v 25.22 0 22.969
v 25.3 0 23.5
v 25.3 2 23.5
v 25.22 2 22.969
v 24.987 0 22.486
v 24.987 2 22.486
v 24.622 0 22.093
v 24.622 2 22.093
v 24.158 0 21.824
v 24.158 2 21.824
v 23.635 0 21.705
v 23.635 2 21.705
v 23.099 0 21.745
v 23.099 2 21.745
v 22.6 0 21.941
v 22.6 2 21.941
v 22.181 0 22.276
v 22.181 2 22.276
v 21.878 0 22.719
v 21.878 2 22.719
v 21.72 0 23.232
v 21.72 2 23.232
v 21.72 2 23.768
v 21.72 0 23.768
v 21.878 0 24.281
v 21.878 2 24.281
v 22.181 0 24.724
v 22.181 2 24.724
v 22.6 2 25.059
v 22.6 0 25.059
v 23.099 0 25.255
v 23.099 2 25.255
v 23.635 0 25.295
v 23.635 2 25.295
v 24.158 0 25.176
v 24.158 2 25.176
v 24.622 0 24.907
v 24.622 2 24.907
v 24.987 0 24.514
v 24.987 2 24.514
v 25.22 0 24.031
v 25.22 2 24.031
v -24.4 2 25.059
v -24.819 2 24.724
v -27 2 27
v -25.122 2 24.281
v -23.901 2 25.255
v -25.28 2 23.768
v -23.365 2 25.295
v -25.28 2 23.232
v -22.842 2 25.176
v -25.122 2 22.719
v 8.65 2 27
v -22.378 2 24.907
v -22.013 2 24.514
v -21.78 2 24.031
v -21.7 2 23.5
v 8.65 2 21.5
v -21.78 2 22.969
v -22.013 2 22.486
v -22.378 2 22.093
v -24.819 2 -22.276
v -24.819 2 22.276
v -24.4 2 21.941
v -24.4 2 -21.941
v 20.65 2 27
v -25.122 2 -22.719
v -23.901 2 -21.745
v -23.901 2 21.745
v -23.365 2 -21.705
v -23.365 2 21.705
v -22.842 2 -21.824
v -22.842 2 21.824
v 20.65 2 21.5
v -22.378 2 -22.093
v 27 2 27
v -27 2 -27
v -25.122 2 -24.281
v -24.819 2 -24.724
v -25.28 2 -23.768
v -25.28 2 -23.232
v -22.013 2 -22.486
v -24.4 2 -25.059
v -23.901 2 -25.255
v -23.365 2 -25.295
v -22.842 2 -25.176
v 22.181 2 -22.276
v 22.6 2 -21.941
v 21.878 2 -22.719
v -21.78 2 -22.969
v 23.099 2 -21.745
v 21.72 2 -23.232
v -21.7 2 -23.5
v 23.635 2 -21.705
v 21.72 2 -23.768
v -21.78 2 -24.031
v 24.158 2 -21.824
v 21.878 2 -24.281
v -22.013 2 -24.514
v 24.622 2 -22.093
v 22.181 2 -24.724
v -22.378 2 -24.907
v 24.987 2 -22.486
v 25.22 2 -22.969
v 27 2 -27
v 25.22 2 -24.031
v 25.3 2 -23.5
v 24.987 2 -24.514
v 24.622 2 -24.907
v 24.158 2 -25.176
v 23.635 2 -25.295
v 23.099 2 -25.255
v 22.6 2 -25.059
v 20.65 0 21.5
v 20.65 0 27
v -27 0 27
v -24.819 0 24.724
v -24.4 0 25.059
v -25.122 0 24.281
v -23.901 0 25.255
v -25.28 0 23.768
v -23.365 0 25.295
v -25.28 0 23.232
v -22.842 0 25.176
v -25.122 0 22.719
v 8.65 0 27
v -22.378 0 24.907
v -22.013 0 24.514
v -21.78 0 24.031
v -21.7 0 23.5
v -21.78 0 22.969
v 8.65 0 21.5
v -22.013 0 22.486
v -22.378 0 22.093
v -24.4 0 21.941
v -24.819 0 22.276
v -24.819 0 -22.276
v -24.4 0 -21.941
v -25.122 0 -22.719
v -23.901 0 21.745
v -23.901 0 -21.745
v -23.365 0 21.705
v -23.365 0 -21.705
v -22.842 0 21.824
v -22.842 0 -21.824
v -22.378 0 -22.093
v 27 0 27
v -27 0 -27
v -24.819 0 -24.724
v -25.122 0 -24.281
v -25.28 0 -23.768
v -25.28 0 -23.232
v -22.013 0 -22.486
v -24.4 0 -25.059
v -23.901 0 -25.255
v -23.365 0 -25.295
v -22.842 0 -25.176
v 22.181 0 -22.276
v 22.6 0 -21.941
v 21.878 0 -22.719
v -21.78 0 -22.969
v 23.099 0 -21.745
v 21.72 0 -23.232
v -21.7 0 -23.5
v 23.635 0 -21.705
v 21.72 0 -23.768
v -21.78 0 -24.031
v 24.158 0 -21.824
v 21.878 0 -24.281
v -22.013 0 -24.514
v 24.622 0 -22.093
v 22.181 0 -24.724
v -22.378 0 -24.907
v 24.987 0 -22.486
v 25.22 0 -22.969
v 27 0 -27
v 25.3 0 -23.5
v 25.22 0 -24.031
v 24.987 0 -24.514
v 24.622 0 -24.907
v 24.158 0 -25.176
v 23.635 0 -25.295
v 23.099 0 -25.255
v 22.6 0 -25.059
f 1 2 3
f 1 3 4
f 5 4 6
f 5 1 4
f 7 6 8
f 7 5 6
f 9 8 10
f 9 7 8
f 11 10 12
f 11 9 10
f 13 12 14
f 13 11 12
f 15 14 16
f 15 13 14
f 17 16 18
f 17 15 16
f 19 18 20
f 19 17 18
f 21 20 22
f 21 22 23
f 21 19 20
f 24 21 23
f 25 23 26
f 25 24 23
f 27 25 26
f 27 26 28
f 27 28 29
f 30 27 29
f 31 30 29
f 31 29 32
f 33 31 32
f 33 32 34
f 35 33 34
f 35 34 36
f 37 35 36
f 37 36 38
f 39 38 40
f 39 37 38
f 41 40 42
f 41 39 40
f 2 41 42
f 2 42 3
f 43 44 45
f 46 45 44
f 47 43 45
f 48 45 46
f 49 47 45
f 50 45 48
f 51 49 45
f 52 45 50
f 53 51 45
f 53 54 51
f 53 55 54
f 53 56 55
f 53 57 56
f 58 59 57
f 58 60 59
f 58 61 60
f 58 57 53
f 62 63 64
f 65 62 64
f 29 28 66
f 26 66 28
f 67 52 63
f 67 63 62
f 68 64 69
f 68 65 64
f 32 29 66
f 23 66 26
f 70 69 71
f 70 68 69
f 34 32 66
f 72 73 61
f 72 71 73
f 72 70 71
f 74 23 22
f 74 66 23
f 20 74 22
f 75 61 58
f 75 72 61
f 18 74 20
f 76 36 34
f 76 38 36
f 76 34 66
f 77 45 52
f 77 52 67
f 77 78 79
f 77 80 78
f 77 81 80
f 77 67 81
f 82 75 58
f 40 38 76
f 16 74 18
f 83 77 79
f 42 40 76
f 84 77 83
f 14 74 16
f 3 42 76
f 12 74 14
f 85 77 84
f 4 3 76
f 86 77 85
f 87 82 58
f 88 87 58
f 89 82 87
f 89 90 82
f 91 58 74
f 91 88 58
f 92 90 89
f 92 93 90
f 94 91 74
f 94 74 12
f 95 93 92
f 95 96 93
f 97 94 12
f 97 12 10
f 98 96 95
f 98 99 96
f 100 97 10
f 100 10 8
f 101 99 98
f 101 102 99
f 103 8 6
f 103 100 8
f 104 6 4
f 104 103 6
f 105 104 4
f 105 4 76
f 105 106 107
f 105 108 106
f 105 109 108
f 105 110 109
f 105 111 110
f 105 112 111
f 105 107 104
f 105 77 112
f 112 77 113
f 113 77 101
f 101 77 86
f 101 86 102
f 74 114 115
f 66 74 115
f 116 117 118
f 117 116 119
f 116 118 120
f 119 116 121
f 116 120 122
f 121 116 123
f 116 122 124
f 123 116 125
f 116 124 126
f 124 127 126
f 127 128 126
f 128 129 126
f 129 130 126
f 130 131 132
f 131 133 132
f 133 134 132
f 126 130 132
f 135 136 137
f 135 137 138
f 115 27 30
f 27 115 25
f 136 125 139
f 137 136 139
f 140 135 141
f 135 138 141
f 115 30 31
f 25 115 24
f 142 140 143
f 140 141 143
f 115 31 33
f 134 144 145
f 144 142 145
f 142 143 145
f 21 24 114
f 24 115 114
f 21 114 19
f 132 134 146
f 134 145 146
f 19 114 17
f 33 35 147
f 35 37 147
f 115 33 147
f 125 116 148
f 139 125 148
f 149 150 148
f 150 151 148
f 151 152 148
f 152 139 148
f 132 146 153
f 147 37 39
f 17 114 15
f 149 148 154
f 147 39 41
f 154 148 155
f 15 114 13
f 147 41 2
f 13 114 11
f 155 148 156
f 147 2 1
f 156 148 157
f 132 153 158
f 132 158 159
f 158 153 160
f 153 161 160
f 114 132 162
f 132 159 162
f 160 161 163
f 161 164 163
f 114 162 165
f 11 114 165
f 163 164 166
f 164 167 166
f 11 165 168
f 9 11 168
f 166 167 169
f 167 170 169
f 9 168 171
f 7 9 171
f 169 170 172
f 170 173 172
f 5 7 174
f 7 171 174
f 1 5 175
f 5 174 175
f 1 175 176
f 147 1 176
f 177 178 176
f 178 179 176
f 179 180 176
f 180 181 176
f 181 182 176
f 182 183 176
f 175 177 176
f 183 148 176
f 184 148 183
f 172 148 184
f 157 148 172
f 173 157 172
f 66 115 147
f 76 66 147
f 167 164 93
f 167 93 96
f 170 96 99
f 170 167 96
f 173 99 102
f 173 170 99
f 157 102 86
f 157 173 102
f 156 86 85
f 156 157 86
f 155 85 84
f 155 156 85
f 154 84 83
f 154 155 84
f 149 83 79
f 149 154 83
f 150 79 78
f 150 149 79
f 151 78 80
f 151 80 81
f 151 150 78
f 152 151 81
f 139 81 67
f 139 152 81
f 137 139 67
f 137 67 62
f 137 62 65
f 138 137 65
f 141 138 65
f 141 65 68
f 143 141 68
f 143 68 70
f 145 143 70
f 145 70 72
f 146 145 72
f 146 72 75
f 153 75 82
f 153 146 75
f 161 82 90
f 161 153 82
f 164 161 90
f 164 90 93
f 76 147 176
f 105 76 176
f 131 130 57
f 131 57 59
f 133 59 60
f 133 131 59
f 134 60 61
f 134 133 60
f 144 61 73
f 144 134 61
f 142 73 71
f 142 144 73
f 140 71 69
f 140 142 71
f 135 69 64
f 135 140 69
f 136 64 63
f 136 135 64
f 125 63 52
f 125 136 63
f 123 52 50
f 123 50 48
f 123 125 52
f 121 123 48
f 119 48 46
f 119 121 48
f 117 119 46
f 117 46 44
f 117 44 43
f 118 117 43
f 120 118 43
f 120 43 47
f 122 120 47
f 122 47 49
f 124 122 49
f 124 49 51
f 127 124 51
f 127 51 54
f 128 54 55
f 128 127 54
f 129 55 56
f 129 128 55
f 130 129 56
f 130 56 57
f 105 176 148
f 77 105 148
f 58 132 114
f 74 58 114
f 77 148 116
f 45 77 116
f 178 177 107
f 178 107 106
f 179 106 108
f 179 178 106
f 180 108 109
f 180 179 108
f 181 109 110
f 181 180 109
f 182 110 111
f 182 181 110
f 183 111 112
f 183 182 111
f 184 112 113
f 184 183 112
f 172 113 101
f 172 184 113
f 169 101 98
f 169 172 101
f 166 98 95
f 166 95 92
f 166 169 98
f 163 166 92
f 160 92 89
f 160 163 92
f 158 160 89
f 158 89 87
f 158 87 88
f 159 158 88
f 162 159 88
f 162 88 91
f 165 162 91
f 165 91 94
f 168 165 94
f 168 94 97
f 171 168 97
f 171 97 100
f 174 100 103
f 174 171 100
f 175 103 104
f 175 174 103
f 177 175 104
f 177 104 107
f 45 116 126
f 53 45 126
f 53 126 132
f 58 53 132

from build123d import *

# Parameters (mm, degrees)
SKETCH_3_R      = 1.8
EXTRUDE_2_DEPTH = 2


with BuildPart() as part:
    # 草图3 → 凸台-拉伸2 (new body)
    with BuildSketch(Plane(origin=(0, 0, 0), x_dir=(1, 0, 0), z_dir=(0, 1, 0))):
        Polygon((27, 27), (-27, 27), (-27, -27), (8.65, -27), (8.65, -21.5), (20.65, -21.5), (20.65, -27), (27, -27), align=None)
        with Locations((-23.5, -23.5)):
            Circle(SKETCH_3_R, mode=Mode.SUBTRACT)
        with Locations((23.5, -23.5)):
            Circle(SKETCH_3_R, mode=Mode.SUBTRACT)
        with Locations((-23.5, 23.5)):
            Circle(SKETCH_3_R, mode=Mode.SUBTRACT)
        with Locations((23.5, 23.5)):
            Circle(SKETCH_3_R, mode=Mode.SUBTRACT)
    extrude(amount=EXTRUDE_2_DEPTH)


solid = part.part
